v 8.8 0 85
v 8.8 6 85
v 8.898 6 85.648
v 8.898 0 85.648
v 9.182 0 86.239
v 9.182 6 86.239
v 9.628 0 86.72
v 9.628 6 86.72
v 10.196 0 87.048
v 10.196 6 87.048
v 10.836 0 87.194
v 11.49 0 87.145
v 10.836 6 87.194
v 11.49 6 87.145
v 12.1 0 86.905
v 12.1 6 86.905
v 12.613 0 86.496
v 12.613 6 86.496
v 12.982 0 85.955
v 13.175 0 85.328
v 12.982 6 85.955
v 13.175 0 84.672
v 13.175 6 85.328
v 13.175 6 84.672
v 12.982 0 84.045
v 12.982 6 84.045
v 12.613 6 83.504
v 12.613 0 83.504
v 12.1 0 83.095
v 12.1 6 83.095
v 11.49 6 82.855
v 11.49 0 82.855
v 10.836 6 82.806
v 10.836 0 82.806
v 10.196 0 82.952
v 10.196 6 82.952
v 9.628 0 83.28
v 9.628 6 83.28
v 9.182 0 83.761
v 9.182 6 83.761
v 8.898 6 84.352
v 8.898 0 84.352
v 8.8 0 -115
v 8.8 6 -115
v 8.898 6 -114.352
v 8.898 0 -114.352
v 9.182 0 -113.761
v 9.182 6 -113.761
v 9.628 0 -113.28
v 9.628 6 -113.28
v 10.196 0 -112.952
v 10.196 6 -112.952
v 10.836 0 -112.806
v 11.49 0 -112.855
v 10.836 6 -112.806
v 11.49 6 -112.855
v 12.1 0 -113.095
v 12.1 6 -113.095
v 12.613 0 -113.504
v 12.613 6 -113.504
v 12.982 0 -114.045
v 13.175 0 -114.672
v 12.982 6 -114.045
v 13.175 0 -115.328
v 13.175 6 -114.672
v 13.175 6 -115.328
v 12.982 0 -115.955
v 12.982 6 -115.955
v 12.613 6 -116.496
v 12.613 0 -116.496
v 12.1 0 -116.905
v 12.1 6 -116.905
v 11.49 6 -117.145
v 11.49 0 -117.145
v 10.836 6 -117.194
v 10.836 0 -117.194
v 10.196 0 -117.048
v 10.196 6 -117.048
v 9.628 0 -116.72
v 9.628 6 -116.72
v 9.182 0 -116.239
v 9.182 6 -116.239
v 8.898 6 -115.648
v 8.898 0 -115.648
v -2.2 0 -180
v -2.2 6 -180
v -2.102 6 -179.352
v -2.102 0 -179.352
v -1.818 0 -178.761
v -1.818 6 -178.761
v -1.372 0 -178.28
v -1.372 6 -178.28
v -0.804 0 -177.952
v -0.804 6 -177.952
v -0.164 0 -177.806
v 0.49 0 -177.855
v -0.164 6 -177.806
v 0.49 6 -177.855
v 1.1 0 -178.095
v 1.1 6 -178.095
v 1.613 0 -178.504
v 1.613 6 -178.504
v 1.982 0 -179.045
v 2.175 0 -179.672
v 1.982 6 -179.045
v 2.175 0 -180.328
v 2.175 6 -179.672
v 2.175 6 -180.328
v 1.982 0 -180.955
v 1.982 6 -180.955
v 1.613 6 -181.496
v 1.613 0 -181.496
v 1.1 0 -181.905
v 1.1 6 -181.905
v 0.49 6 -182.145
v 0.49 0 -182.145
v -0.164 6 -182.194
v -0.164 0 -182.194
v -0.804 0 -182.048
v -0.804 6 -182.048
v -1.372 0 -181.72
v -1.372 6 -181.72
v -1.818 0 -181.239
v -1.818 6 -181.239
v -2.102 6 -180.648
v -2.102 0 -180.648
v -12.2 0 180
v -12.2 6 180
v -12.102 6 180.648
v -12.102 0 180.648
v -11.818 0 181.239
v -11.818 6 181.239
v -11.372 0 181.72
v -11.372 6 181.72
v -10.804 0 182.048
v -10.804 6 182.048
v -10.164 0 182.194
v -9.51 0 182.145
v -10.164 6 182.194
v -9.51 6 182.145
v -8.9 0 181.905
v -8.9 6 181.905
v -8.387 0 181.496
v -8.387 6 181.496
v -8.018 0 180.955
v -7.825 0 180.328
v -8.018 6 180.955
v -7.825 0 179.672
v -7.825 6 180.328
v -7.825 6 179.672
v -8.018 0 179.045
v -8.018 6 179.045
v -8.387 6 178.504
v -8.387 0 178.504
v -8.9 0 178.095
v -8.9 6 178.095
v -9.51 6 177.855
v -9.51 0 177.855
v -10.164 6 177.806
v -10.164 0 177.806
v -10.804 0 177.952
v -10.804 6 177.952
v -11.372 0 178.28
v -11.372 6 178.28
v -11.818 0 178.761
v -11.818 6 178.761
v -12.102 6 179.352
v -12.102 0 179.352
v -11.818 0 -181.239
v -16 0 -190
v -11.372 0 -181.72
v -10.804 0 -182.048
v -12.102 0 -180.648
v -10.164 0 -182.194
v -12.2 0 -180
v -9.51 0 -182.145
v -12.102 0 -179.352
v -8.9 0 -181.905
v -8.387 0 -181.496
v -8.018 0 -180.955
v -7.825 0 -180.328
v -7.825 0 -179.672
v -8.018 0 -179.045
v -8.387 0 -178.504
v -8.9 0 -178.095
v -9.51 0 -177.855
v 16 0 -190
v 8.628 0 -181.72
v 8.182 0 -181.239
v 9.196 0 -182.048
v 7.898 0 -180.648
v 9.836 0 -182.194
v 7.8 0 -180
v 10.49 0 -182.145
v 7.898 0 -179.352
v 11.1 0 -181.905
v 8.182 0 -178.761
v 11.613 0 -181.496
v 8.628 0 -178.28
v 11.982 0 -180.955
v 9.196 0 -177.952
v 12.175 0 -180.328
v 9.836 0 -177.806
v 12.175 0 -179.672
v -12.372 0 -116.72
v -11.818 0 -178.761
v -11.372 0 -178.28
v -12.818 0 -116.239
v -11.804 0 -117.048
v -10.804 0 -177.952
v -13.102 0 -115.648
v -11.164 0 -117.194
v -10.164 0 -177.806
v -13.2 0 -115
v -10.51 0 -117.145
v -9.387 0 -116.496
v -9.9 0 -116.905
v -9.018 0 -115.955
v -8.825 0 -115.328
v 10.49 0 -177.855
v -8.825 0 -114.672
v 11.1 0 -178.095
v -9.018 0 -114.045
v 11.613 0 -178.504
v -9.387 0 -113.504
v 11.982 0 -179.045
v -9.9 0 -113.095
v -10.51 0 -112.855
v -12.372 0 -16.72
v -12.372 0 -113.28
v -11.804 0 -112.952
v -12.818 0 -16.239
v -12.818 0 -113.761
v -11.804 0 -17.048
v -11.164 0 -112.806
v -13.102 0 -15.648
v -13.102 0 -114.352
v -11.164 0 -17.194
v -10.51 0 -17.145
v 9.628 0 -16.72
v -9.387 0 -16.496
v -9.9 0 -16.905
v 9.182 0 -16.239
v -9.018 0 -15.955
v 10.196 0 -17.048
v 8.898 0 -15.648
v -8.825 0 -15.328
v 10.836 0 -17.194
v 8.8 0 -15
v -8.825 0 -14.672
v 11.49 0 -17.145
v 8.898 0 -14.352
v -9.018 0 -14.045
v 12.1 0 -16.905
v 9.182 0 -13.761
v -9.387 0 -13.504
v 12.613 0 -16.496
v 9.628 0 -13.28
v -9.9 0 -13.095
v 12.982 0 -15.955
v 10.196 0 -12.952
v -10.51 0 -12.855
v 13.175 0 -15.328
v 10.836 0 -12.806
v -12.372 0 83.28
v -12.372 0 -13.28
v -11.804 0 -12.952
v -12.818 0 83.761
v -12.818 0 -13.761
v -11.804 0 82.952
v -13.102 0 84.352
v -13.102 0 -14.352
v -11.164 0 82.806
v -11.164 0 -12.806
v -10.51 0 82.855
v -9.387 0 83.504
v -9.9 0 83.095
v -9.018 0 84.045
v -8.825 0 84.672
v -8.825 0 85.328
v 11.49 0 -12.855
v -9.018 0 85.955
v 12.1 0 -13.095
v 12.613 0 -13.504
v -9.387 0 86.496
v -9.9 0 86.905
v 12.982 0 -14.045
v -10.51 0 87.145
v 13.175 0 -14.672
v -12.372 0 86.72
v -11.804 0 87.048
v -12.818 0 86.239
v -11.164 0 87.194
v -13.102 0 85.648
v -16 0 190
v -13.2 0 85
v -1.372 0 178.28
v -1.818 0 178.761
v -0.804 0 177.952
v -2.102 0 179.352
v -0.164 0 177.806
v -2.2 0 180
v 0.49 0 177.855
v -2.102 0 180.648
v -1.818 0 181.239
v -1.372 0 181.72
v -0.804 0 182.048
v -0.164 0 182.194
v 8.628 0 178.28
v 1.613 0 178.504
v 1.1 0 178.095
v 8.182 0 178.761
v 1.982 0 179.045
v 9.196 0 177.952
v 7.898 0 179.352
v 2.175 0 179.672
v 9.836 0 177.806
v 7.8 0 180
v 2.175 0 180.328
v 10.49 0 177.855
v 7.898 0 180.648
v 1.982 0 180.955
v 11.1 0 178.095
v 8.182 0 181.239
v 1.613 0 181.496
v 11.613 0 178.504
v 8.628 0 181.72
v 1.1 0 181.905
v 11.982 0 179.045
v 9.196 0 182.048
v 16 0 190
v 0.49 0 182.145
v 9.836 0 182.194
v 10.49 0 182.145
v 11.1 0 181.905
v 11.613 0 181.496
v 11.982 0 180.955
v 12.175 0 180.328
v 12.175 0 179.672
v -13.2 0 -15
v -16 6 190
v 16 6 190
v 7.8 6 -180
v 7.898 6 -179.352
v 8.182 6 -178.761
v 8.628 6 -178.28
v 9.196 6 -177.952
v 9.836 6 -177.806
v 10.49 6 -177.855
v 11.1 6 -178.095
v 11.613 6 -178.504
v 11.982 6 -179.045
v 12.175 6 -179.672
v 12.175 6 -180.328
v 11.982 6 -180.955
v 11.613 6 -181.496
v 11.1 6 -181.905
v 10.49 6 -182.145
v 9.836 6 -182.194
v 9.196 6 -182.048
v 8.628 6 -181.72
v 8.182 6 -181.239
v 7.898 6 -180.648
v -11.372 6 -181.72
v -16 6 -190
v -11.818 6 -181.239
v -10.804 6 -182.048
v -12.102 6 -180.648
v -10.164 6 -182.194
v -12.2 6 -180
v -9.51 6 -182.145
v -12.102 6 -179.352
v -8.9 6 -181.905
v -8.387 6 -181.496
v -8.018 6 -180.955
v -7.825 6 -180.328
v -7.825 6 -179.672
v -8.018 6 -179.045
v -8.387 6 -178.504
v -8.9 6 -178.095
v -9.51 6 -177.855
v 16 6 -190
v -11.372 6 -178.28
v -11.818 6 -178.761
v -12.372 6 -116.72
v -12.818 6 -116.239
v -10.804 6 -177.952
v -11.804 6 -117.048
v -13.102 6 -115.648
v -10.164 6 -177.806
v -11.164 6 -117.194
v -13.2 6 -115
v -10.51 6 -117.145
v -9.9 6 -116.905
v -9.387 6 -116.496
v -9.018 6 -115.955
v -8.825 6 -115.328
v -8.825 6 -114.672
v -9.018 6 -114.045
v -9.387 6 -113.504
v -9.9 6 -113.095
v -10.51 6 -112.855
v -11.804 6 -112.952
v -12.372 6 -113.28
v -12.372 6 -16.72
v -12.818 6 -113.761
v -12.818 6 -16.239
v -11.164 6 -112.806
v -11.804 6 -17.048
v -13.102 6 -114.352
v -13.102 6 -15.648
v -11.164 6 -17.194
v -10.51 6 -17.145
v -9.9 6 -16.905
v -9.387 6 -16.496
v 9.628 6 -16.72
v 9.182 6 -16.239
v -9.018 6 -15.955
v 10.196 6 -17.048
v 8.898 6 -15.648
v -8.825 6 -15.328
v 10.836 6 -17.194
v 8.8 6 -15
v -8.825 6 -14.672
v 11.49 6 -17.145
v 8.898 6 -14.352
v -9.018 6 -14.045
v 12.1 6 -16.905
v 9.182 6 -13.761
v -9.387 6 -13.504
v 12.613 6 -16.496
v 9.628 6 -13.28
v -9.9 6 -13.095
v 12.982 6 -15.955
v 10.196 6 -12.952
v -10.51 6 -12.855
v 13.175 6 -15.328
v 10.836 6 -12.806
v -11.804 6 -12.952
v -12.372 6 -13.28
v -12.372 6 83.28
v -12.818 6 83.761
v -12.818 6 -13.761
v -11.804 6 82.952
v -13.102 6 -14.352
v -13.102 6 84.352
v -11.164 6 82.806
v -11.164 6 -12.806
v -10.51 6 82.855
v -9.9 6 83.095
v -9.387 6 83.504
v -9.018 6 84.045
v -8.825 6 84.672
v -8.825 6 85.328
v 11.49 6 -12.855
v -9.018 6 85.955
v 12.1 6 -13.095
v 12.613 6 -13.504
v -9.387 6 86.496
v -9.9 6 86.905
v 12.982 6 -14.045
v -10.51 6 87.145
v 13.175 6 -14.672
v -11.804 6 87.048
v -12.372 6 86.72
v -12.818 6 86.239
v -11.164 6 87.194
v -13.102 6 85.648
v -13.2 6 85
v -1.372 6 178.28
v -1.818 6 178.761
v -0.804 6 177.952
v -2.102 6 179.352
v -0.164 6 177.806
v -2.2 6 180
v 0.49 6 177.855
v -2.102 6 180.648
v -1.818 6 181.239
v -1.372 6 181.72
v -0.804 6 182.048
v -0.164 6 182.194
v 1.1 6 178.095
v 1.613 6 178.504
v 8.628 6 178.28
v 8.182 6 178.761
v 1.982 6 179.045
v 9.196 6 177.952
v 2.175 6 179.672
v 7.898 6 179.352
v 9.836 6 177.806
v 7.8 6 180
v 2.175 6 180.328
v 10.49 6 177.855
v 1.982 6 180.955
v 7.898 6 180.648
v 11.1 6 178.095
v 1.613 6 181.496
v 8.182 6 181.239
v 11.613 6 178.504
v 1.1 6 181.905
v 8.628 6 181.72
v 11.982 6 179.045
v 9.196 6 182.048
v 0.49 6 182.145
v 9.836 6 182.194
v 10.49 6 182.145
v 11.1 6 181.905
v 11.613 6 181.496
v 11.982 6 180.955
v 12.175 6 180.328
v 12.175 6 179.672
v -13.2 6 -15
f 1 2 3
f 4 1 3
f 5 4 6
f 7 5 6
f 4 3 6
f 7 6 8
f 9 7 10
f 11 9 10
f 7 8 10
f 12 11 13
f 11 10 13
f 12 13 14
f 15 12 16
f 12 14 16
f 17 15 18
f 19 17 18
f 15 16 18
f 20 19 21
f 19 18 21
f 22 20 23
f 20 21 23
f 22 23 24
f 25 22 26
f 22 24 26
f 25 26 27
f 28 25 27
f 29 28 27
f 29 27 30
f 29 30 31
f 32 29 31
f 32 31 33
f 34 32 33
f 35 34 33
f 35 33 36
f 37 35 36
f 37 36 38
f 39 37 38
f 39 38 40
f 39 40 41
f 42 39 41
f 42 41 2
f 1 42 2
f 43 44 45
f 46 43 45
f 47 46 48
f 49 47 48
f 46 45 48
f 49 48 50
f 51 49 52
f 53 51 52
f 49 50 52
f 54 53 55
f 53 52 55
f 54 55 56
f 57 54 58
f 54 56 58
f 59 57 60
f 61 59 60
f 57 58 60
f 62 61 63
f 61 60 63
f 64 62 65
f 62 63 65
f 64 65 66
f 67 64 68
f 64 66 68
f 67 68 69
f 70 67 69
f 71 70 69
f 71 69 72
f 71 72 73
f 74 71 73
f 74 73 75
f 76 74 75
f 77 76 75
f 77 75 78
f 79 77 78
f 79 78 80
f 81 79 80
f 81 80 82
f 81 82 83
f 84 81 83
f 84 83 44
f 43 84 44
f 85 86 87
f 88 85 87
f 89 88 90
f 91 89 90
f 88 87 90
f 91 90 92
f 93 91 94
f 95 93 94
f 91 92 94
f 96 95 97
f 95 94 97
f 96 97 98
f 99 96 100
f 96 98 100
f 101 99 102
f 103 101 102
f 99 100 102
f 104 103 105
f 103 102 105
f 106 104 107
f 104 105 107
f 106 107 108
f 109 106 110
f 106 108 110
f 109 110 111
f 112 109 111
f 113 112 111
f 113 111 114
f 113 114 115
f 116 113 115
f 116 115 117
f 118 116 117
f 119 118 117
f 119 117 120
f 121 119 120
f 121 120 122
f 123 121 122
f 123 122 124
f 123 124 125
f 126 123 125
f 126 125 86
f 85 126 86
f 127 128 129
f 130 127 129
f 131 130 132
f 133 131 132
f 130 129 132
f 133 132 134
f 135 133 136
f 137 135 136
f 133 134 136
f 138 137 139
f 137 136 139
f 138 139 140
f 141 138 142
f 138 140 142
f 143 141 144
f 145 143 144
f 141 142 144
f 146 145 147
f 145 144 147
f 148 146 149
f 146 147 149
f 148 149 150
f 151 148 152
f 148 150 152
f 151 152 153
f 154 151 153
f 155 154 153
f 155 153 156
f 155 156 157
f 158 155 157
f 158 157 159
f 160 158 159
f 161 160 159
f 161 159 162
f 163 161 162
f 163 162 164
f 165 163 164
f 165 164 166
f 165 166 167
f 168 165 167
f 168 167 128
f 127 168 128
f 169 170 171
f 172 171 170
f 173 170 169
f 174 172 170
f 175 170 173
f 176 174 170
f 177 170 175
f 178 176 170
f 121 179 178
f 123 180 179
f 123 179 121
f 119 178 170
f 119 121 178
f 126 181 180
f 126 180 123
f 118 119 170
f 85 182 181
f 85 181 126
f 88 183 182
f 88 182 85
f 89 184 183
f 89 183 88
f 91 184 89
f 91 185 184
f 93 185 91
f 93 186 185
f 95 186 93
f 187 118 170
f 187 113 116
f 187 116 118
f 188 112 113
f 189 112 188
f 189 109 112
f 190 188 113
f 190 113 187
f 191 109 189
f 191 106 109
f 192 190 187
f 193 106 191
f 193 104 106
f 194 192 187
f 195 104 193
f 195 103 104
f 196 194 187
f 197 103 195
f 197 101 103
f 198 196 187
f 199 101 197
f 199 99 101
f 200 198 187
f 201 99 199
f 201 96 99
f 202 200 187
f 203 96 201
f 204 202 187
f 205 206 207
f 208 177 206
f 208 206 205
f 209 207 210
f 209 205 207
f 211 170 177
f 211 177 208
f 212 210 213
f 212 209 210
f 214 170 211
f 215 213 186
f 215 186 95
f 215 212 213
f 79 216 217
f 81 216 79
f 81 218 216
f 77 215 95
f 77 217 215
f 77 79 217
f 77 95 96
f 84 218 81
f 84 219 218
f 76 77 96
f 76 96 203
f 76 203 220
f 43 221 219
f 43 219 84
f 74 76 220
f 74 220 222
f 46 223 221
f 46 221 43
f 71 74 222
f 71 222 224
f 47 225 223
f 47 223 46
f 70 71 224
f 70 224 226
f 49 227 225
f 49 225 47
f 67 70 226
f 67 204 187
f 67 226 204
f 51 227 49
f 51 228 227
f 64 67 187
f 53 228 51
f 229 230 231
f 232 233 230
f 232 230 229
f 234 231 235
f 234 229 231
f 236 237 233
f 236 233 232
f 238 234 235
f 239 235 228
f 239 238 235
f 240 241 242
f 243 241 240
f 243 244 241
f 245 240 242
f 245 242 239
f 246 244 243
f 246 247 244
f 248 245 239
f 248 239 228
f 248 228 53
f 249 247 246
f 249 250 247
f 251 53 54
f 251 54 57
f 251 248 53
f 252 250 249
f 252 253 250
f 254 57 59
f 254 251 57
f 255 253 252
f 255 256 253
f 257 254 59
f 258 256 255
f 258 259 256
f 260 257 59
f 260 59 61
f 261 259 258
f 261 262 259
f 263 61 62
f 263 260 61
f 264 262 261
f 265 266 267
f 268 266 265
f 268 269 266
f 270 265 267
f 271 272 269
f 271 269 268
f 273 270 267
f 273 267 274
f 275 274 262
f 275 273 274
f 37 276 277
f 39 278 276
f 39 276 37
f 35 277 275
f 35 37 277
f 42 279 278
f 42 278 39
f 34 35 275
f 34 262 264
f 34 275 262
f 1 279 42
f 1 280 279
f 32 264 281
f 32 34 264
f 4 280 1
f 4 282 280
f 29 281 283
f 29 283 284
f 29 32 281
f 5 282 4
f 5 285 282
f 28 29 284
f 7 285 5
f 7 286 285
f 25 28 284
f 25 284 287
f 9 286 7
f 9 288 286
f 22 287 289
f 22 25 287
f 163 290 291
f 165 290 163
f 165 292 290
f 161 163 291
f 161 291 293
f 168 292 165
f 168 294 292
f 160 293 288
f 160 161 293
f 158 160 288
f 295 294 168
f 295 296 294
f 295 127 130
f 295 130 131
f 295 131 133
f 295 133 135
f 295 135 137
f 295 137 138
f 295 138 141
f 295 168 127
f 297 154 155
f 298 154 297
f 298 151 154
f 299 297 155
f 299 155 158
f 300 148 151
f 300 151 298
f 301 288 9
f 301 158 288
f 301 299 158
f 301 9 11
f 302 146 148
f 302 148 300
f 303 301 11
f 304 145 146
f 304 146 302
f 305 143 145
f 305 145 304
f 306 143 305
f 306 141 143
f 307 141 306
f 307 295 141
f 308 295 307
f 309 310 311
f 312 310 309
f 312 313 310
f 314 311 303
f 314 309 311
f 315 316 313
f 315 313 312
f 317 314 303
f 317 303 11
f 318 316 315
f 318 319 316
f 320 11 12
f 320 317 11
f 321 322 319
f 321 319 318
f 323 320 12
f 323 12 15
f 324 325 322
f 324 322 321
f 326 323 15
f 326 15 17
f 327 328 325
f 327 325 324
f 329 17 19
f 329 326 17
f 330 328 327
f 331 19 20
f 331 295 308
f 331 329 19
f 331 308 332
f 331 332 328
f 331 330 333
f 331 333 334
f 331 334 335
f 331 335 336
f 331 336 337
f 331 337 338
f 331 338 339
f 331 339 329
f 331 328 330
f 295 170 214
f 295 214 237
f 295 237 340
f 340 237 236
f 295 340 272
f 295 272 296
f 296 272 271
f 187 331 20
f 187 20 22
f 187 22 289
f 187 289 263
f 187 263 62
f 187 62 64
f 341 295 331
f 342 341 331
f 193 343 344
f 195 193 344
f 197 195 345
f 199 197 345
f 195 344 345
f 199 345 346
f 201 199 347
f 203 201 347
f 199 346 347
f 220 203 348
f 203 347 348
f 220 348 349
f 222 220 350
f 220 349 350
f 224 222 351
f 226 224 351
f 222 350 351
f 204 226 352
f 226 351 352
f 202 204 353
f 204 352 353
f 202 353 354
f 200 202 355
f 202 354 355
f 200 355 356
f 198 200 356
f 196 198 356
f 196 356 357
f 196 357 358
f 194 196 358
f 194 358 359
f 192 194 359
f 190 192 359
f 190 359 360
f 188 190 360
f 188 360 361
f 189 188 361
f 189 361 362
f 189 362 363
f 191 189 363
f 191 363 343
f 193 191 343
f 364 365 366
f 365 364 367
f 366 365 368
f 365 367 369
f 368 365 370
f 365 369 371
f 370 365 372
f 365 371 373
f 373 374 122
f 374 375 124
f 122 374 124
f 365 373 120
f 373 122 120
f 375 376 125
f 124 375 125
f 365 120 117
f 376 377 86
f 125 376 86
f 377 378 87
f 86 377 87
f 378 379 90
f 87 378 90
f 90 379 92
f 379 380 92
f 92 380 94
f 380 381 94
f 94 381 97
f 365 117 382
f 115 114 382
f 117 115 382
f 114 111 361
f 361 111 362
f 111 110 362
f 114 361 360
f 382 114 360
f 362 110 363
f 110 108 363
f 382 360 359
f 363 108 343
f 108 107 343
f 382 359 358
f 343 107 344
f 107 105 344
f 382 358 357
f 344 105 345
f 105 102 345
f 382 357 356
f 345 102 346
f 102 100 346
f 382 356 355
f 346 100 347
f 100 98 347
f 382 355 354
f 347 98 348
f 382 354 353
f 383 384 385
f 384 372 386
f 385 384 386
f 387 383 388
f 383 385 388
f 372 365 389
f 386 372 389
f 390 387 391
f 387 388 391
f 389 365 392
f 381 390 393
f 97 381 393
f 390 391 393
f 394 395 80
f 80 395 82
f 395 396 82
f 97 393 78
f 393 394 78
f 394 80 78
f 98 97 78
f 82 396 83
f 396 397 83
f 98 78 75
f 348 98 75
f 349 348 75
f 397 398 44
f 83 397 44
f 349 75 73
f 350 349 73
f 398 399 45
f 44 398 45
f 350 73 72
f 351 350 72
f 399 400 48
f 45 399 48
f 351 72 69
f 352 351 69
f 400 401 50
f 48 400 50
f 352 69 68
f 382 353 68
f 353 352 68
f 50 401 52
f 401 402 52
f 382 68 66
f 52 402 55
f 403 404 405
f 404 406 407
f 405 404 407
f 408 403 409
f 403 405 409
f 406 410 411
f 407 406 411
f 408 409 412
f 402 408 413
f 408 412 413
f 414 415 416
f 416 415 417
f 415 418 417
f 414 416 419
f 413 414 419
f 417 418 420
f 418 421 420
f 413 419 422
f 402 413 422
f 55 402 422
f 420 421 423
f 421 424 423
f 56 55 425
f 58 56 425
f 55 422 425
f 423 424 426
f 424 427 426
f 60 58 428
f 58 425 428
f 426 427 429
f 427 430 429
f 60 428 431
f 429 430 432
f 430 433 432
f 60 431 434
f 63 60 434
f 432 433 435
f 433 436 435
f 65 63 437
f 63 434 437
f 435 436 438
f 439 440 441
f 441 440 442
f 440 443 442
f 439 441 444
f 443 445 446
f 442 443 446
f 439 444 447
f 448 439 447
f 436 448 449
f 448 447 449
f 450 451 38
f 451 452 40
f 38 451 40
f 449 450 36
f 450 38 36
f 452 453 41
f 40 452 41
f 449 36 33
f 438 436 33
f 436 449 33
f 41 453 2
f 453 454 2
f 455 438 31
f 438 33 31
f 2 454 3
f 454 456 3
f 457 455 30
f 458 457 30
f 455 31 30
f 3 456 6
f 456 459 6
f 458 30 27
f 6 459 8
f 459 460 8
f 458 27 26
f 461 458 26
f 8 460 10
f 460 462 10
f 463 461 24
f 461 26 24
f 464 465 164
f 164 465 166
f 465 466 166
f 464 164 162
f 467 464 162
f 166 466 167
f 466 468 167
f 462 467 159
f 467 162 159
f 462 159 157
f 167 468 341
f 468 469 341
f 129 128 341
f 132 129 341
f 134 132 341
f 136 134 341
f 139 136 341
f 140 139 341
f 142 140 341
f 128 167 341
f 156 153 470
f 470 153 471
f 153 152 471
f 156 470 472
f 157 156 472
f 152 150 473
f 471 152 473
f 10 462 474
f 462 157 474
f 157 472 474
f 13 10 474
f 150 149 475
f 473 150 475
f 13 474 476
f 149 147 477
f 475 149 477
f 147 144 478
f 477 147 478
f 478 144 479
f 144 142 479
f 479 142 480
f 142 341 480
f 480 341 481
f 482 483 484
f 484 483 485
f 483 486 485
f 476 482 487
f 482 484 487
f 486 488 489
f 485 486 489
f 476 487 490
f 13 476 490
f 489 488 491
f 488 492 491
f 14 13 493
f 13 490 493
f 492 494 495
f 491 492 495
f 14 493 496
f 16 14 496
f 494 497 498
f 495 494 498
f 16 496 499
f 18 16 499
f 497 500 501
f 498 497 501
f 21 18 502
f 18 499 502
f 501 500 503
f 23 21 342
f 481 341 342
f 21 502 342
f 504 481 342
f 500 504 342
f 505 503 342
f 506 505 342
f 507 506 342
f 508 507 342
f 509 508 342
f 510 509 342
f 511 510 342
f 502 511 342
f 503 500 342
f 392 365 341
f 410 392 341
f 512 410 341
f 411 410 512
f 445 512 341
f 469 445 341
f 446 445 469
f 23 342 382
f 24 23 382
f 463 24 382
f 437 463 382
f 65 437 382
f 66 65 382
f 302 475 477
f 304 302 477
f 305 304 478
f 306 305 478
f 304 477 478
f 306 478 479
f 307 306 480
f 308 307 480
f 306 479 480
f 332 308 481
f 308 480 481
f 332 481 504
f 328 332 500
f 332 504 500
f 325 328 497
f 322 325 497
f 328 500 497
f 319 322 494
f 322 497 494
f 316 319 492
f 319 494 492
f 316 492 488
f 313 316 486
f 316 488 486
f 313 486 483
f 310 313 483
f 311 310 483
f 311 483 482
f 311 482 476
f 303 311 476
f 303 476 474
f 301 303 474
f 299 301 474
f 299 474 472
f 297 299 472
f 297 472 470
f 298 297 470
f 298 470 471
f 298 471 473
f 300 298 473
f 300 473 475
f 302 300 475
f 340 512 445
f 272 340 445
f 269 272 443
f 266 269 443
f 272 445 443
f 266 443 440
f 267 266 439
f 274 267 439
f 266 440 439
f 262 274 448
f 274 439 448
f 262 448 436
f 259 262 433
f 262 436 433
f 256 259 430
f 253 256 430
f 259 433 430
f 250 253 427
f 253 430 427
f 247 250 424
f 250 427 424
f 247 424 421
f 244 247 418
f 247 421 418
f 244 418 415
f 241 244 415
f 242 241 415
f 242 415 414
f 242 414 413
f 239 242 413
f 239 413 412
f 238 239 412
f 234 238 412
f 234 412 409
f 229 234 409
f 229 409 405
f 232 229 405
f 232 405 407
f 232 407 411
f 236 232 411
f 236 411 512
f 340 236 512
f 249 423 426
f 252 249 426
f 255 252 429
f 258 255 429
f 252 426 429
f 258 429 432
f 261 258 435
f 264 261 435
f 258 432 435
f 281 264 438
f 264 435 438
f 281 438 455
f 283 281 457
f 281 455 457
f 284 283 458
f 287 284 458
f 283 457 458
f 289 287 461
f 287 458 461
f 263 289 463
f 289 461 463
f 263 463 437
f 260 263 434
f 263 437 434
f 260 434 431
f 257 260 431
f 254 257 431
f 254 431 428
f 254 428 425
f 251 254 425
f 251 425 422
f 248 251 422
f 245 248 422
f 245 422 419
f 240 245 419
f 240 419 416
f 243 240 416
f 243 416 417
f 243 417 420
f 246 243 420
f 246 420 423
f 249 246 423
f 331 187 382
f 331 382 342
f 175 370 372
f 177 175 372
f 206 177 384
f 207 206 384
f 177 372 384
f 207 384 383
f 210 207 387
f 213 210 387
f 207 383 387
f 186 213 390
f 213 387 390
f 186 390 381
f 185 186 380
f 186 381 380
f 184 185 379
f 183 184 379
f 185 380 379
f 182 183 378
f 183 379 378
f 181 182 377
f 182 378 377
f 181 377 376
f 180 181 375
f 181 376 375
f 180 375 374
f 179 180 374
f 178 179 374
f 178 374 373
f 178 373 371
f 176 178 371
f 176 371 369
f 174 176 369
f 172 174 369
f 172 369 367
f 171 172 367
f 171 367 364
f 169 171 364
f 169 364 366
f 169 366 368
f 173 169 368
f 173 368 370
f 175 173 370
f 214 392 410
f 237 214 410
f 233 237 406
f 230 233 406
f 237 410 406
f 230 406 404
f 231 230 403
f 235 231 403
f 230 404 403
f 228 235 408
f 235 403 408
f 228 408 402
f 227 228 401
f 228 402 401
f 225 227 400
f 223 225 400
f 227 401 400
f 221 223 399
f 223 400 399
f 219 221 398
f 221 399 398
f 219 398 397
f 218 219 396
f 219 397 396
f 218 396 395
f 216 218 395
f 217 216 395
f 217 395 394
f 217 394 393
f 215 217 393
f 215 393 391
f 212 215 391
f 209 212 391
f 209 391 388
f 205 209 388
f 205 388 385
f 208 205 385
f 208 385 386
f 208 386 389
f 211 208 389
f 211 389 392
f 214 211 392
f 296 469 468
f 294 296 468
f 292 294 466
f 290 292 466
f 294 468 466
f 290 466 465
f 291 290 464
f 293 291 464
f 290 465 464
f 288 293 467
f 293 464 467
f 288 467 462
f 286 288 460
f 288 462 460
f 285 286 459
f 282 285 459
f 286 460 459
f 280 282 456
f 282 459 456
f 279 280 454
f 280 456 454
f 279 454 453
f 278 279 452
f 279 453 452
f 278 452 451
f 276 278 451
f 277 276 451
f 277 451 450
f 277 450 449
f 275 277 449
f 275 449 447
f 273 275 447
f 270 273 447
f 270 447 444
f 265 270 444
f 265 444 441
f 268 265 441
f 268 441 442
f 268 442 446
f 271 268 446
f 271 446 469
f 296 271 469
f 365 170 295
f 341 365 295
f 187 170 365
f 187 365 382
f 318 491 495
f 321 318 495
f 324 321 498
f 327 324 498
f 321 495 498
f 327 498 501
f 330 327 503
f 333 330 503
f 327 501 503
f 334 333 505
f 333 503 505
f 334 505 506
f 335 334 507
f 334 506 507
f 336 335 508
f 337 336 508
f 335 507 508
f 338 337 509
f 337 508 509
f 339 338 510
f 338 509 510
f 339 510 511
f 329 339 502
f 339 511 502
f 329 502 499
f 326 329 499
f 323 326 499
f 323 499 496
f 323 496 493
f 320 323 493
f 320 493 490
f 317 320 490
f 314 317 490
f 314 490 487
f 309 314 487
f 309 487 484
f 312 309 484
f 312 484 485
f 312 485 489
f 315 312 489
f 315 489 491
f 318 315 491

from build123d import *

# Parameters (mm, degrees)
F0_W     = 32
F0_H     = 380
F1_DEPTH = 6
F2_D     = 4.4
F2_DEPTH = 10
F2_TIP   = 1.3218933619


with BuildPart() as f1:
    # F0 (on Front) → F1 (new body)
    with BuildSketch(Plane.XZ):
        Rectangle(F0_W, F0_H)
    extrude(amount=-F1_DEPTH)

    # F2
    with Locations(Plane.XZ):
        with Locations((-10, -180), (0, -180), (10, -180), (-10, 180), (0, 180), (10, 180), (-11, -115), (11, -115), (-11, -15), (11, -15), (-11, 85), (11, 85)):
            Hole(F2_D / 2, depth=F2_DEPTH)
            with Locations((0, 0, -(F2_DEPTH + F2_TIP / 2))):  # 118° drill point
                Cone(0, F2_D / 2, F2_TIP, mode=Mode.SUBTRACT)


solid = f1.part
